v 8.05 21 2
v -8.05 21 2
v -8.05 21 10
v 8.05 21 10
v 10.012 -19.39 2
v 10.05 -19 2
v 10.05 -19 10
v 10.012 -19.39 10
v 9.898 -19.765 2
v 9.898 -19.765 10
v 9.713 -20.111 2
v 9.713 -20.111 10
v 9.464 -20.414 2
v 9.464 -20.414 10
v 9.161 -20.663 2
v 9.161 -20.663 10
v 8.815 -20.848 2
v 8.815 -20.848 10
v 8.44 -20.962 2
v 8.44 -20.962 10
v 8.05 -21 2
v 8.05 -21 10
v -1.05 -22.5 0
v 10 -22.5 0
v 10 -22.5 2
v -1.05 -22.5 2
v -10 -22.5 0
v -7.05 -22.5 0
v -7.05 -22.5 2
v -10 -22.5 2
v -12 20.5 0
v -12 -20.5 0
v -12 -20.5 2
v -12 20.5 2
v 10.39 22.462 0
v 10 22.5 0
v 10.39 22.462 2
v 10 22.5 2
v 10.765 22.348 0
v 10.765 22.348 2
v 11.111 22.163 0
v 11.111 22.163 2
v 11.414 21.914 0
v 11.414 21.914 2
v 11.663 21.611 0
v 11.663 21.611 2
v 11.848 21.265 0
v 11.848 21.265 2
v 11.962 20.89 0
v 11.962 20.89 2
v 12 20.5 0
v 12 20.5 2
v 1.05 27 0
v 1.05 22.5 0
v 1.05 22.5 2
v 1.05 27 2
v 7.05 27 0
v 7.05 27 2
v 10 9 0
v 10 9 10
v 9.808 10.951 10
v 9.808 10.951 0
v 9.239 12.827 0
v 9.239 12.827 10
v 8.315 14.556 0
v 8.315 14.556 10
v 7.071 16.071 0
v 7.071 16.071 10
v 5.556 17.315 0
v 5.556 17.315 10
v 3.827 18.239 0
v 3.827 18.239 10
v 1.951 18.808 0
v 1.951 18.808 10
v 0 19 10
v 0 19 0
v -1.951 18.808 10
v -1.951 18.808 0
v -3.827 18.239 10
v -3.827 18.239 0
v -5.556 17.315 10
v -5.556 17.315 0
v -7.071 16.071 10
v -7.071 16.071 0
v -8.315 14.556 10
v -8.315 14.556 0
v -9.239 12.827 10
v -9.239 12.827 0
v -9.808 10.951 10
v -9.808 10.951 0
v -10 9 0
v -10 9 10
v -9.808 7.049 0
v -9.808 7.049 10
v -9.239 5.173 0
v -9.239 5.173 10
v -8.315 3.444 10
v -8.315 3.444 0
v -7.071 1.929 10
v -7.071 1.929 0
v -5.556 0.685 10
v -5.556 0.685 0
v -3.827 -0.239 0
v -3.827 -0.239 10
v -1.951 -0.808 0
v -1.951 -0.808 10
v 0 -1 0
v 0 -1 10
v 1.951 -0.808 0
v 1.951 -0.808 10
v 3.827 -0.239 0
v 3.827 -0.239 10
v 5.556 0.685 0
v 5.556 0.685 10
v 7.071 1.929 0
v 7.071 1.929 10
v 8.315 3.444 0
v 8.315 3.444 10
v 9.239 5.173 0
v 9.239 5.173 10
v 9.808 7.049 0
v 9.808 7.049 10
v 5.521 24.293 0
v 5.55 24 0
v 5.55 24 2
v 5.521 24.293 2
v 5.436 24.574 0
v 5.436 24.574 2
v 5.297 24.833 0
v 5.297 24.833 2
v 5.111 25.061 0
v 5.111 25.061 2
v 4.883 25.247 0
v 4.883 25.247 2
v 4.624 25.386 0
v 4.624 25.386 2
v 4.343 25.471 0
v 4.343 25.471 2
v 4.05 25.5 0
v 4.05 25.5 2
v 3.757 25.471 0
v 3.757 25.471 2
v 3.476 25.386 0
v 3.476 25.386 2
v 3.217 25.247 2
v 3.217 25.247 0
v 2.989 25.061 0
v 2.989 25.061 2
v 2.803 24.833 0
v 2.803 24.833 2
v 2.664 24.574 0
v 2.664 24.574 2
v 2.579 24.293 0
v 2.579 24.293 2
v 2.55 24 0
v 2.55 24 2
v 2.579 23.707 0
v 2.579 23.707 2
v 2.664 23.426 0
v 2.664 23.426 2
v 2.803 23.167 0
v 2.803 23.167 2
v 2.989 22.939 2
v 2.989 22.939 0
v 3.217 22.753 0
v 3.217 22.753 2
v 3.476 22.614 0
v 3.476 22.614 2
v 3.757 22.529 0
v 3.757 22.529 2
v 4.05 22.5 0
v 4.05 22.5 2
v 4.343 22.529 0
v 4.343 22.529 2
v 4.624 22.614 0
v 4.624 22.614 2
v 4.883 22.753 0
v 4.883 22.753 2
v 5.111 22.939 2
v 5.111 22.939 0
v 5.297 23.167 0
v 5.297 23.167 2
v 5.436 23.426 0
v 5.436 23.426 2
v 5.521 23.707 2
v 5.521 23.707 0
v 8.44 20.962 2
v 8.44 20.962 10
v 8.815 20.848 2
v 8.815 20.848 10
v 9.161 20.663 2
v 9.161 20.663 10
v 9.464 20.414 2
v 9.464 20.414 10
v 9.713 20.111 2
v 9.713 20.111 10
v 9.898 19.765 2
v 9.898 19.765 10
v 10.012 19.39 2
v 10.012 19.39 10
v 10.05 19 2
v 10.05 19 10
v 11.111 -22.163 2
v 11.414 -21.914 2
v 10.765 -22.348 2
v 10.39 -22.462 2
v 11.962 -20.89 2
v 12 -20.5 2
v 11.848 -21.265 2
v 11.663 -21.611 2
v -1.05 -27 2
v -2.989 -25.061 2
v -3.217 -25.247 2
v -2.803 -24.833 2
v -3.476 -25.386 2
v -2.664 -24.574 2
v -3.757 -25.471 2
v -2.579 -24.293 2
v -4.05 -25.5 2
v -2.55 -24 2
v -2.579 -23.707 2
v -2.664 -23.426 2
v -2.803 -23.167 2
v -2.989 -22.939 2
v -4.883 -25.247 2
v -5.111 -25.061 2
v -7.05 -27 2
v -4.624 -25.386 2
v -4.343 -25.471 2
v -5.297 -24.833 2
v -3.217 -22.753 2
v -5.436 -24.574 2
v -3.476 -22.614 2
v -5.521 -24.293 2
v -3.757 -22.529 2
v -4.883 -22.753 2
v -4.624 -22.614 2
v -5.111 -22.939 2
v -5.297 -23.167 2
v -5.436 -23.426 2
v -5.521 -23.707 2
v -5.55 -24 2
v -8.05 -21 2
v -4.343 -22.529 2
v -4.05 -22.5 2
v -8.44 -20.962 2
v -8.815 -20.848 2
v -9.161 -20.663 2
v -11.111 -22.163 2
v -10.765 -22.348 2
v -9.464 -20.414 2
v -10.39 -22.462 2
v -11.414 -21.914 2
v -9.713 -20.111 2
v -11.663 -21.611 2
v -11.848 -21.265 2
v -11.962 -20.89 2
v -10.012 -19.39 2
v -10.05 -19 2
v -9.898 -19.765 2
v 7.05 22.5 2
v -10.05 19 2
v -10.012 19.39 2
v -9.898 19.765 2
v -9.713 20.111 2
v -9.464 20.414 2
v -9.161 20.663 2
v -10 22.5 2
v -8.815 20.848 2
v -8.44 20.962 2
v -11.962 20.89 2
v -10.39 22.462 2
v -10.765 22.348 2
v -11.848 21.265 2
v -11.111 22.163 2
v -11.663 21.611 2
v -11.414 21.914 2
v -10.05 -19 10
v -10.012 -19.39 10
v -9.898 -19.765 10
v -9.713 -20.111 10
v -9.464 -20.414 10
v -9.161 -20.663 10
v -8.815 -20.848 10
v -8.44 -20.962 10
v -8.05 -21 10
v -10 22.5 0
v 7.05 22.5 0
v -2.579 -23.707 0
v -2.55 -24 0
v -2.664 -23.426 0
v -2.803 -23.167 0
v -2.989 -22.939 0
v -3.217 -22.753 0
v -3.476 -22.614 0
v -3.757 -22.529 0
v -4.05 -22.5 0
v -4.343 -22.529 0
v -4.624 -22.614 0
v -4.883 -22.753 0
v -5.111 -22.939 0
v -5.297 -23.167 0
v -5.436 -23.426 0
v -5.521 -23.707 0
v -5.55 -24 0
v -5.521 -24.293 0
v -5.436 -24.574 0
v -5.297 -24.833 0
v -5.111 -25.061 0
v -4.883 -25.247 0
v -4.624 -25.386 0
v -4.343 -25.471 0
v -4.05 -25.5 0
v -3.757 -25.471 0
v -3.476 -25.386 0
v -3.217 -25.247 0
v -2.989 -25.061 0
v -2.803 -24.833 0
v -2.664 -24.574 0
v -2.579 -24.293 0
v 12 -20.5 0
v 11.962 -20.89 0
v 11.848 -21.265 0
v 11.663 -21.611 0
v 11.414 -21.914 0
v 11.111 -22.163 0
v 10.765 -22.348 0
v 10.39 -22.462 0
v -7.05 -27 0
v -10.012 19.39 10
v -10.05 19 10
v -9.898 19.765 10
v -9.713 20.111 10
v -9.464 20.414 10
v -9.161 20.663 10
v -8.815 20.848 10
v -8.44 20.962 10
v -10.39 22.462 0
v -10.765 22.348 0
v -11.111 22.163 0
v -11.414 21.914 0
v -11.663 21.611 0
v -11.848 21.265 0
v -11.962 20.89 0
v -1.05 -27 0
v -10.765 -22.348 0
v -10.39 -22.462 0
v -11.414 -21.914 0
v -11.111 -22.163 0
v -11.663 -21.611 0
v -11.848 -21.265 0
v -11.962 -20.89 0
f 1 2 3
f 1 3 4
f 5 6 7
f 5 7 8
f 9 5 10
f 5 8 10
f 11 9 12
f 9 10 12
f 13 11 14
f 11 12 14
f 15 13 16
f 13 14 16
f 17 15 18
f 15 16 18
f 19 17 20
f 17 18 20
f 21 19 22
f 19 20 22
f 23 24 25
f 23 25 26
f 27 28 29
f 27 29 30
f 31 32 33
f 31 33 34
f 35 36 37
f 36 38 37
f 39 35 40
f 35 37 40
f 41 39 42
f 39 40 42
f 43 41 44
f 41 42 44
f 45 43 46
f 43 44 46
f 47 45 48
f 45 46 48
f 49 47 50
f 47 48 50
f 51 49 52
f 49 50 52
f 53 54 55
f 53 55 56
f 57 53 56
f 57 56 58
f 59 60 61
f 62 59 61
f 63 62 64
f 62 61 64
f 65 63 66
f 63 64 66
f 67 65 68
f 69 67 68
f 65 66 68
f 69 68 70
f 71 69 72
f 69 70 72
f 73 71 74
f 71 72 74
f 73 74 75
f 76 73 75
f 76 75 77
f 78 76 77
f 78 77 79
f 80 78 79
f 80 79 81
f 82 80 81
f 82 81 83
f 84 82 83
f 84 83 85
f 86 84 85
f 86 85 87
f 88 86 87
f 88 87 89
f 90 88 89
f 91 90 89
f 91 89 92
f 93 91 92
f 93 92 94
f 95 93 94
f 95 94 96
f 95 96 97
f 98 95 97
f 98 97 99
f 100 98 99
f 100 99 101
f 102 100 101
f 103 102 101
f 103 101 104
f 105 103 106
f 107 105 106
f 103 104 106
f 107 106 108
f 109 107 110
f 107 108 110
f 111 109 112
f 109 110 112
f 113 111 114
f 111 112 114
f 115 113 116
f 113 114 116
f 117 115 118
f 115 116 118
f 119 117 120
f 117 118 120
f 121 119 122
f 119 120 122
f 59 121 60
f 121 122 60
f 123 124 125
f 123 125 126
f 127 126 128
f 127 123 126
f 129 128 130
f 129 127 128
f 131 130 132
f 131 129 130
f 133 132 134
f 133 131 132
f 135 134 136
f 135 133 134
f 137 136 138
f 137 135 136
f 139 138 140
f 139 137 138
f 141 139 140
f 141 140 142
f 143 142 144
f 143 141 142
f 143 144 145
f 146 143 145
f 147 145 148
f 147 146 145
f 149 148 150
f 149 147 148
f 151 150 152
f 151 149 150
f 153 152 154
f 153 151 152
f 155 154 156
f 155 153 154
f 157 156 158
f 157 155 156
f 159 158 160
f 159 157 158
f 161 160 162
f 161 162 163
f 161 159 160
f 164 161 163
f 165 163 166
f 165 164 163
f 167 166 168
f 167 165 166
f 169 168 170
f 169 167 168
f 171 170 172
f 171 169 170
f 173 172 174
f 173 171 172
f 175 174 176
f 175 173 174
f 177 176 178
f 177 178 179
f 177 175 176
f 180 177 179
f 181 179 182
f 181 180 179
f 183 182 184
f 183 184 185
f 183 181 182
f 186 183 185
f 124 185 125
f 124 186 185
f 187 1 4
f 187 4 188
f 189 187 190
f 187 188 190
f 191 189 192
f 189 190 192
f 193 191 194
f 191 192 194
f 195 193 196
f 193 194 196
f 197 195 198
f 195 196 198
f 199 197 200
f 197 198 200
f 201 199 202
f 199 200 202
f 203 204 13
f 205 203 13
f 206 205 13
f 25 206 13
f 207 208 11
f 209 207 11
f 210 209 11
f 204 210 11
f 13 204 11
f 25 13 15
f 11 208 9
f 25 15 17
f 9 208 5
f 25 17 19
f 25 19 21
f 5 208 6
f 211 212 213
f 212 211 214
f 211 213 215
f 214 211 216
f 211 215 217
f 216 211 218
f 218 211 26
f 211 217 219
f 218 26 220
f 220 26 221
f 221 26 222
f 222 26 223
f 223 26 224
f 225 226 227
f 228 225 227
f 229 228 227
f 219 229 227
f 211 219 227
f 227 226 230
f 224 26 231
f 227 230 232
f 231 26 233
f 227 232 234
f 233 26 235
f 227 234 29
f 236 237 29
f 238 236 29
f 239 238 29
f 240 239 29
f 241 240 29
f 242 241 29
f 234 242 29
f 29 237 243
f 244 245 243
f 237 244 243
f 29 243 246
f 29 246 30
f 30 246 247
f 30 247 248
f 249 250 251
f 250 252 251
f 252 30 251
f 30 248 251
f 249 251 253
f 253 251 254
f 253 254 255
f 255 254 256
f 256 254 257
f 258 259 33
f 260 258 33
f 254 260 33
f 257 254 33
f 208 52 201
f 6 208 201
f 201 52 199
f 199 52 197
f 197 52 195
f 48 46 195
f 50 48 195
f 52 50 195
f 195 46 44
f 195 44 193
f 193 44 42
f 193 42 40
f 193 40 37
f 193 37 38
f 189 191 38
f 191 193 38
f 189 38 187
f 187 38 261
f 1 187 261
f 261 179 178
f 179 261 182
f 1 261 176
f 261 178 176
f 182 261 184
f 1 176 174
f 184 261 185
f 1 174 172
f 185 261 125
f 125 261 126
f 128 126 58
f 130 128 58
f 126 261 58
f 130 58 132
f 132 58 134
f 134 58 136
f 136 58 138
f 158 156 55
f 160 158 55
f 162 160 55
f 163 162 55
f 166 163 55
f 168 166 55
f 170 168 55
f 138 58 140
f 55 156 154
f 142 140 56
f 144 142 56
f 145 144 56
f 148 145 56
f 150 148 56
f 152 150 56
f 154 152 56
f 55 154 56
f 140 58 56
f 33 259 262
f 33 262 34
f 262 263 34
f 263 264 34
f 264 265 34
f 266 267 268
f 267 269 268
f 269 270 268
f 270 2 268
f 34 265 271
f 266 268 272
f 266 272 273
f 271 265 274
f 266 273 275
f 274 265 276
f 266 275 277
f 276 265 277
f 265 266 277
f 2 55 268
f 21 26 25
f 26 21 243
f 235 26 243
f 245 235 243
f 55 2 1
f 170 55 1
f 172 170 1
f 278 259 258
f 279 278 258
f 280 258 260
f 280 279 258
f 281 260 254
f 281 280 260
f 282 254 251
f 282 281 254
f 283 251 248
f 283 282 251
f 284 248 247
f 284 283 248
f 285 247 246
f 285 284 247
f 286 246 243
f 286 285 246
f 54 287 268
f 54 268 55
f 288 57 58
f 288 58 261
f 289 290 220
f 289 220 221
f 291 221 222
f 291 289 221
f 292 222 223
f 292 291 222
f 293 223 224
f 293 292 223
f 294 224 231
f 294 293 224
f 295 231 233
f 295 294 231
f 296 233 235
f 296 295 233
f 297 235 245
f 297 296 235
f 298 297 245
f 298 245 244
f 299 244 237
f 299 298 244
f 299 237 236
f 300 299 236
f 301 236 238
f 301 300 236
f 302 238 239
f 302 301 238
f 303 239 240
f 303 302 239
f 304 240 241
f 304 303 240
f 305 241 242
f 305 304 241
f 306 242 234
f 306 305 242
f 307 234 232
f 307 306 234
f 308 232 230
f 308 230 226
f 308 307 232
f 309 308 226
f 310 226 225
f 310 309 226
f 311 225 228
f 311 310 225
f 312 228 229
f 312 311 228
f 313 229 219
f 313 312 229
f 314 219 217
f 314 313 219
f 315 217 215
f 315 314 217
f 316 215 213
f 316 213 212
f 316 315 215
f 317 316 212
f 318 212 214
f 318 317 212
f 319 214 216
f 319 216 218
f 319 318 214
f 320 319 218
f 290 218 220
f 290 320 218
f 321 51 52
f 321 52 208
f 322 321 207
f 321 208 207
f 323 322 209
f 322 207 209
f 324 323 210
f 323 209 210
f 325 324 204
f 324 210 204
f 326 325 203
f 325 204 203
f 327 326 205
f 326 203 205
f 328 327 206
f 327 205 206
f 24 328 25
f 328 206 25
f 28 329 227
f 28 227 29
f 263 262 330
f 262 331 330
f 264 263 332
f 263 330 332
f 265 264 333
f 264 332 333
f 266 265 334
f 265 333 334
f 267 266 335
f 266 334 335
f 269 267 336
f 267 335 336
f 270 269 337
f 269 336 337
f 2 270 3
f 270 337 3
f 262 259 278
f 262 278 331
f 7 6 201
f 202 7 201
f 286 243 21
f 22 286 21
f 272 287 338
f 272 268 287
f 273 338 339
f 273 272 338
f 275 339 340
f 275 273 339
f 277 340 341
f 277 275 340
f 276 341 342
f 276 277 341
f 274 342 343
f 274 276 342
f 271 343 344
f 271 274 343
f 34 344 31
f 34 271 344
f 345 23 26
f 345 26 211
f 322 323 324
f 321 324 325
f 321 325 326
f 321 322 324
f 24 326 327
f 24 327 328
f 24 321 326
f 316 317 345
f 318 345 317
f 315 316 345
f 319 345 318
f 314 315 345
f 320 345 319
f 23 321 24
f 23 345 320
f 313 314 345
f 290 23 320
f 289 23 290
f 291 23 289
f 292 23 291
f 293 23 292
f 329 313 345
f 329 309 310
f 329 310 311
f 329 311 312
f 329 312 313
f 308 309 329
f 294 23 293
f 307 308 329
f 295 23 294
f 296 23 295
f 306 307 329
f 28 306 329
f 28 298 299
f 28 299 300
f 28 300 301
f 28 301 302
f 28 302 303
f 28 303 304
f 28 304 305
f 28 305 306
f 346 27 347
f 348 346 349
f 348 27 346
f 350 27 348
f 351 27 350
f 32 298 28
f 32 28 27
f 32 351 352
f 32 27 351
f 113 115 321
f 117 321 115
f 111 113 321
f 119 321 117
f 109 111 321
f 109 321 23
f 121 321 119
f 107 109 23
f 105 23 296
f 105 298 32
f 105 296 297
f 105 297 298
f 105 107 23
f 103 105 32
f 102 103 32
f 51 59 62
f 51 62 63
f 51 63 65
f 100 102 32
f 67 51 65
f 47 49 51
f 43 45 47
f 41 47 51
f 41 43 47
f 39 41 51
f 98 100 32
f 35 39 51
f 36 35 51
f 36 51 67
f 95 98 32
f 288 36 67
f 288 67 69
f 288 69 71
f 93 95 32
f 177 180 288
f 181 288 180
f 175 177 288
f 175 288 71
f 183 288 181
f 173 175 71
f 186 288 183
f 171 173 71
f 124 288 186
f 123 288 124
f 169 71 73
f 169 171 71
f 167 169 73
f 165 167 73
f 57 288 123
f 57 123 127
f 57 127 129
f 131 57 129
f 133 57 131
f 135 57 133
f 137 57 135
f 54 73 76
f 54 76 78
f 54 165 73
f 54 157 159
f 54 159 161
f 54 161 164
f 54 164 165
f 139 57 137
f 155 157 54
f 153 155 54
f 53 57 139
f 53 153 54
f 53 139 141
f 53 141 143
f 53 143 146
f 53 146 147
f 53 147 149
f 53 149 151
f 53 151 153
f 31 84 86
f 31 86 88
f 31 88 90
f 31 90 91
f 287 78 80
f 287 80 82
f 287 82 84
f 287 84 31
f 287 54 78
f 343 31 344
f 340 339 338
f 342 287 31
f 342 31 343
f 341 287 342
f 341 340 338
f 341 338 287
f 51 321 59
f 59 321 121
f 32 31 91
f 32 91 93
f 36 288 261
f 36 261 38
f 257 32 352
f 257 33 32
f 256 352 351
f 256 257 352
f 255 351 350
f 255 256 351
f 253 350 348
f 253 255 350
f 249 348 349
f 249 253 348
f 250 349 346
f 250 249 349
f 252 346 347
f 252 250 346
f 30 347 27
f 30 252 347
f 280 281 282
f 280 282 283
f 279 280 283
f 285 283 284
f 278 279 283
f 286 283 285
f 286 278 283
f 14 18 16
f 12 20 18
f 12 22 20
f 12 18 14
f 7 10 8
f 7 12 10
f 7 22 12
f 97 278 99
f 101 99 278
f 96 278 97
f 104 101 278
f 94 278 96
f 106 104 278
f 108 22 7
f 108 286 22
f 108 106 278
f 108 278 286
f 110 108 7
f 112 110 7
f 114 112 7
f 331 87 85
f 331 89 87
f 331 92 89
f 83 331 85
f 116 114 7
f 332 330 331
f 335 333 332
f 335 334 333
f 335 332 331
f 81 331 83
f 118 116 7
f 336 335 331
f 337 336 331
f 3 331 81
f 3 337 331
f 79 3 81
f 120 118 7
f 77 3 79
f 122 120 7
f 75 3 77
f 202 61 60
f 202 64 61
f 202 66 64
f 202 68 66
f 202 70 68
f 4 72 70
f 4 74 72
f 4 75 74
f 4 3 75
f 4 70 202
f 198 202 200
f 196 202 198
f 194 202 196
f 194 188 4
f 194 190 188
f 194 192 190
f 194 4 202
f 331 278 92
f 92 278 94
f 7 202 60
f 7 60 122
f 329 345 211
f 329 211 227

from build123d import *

# Parameters (mm, degrees)
SKETCH1_R           = 1.5
BOSS_EXTRUDE1_DEPTH = 2
FILLET1_R           = 2
SKETCH3_W           = 20.1
SKETCH3_H           = 42
BOSS_EXTRUDE2_DEPTH = 8
FILLET2_R           = 2
SKETCH5_R           = 10
CUT_EXTRUDE3_DEPTH  = 11


with BuildPart() as part:
    # Sketch1 → Boss-Extrude1 (new body)
    with BuildSketch(Plane.XY):
        Polygon((1.05, 22.5), (1.05, 27), (7.05, 27), (7.05, 22.5), (12, 22.5), (12, -22.5), (-1.05, -22.5), (-1.05, -27), (-7.05, -27), (-7.05, -22.5), (-12, -22.5), (-12, 22.5), align=None)
        with Locations((4.05, 24)):
            Circle(SKETCH1_R, mode=Mode.SUBTRACT)
        with Locations((-4.05, -24)):
            Circle(SKETCH1_R, mode=Mode.SUBTRACT)
    extrude(amount=BOSS_EXTRUDE1_DEPTH)

    # Fillet1
    fillet1_edges = [part.edges().sort_by_distance(p)[0] for p in [
        (12, 22.5, 1),
        (12, -22.5, 1),
        (-12, -22.5, 1),
        (-12, 22.5, 1),
    ]]
    fillet(fillet1_edges, radius=FILLET1_R)

    # Sketch3 → Boss-Extrude2 (add)
    with BuildSketch(Plane.XY.offset(2)):
        Rectangle(SKETCH3_W, SKETCH3_H)
    extrude(amount=BOSS_EXTRUDE2_DEPTH)

    # Fillet2
    fillet2_edges = [part.edges().sort_by_distance(p)[0] for p in [
        (-10.05, 21, 6),
        (-10.05, -21, 6),
        (10.05, -21, 6),
        (10.05, 21, 6),
    ]]
    fillet(fillet2_edges, radius=FILLET2_R)

    # Sketch5 → Cut-Extrude3 (cut, through all)
    with BuildSketch(Plane.XY.offset(10)):
        with Locations((0, 9)):
            Circle(SKETCH5_R)
    extrude(amount=-CUT_EXTRUDE3_DEPTH, mode=Mode.SUBTRACT)


solid = part.part
